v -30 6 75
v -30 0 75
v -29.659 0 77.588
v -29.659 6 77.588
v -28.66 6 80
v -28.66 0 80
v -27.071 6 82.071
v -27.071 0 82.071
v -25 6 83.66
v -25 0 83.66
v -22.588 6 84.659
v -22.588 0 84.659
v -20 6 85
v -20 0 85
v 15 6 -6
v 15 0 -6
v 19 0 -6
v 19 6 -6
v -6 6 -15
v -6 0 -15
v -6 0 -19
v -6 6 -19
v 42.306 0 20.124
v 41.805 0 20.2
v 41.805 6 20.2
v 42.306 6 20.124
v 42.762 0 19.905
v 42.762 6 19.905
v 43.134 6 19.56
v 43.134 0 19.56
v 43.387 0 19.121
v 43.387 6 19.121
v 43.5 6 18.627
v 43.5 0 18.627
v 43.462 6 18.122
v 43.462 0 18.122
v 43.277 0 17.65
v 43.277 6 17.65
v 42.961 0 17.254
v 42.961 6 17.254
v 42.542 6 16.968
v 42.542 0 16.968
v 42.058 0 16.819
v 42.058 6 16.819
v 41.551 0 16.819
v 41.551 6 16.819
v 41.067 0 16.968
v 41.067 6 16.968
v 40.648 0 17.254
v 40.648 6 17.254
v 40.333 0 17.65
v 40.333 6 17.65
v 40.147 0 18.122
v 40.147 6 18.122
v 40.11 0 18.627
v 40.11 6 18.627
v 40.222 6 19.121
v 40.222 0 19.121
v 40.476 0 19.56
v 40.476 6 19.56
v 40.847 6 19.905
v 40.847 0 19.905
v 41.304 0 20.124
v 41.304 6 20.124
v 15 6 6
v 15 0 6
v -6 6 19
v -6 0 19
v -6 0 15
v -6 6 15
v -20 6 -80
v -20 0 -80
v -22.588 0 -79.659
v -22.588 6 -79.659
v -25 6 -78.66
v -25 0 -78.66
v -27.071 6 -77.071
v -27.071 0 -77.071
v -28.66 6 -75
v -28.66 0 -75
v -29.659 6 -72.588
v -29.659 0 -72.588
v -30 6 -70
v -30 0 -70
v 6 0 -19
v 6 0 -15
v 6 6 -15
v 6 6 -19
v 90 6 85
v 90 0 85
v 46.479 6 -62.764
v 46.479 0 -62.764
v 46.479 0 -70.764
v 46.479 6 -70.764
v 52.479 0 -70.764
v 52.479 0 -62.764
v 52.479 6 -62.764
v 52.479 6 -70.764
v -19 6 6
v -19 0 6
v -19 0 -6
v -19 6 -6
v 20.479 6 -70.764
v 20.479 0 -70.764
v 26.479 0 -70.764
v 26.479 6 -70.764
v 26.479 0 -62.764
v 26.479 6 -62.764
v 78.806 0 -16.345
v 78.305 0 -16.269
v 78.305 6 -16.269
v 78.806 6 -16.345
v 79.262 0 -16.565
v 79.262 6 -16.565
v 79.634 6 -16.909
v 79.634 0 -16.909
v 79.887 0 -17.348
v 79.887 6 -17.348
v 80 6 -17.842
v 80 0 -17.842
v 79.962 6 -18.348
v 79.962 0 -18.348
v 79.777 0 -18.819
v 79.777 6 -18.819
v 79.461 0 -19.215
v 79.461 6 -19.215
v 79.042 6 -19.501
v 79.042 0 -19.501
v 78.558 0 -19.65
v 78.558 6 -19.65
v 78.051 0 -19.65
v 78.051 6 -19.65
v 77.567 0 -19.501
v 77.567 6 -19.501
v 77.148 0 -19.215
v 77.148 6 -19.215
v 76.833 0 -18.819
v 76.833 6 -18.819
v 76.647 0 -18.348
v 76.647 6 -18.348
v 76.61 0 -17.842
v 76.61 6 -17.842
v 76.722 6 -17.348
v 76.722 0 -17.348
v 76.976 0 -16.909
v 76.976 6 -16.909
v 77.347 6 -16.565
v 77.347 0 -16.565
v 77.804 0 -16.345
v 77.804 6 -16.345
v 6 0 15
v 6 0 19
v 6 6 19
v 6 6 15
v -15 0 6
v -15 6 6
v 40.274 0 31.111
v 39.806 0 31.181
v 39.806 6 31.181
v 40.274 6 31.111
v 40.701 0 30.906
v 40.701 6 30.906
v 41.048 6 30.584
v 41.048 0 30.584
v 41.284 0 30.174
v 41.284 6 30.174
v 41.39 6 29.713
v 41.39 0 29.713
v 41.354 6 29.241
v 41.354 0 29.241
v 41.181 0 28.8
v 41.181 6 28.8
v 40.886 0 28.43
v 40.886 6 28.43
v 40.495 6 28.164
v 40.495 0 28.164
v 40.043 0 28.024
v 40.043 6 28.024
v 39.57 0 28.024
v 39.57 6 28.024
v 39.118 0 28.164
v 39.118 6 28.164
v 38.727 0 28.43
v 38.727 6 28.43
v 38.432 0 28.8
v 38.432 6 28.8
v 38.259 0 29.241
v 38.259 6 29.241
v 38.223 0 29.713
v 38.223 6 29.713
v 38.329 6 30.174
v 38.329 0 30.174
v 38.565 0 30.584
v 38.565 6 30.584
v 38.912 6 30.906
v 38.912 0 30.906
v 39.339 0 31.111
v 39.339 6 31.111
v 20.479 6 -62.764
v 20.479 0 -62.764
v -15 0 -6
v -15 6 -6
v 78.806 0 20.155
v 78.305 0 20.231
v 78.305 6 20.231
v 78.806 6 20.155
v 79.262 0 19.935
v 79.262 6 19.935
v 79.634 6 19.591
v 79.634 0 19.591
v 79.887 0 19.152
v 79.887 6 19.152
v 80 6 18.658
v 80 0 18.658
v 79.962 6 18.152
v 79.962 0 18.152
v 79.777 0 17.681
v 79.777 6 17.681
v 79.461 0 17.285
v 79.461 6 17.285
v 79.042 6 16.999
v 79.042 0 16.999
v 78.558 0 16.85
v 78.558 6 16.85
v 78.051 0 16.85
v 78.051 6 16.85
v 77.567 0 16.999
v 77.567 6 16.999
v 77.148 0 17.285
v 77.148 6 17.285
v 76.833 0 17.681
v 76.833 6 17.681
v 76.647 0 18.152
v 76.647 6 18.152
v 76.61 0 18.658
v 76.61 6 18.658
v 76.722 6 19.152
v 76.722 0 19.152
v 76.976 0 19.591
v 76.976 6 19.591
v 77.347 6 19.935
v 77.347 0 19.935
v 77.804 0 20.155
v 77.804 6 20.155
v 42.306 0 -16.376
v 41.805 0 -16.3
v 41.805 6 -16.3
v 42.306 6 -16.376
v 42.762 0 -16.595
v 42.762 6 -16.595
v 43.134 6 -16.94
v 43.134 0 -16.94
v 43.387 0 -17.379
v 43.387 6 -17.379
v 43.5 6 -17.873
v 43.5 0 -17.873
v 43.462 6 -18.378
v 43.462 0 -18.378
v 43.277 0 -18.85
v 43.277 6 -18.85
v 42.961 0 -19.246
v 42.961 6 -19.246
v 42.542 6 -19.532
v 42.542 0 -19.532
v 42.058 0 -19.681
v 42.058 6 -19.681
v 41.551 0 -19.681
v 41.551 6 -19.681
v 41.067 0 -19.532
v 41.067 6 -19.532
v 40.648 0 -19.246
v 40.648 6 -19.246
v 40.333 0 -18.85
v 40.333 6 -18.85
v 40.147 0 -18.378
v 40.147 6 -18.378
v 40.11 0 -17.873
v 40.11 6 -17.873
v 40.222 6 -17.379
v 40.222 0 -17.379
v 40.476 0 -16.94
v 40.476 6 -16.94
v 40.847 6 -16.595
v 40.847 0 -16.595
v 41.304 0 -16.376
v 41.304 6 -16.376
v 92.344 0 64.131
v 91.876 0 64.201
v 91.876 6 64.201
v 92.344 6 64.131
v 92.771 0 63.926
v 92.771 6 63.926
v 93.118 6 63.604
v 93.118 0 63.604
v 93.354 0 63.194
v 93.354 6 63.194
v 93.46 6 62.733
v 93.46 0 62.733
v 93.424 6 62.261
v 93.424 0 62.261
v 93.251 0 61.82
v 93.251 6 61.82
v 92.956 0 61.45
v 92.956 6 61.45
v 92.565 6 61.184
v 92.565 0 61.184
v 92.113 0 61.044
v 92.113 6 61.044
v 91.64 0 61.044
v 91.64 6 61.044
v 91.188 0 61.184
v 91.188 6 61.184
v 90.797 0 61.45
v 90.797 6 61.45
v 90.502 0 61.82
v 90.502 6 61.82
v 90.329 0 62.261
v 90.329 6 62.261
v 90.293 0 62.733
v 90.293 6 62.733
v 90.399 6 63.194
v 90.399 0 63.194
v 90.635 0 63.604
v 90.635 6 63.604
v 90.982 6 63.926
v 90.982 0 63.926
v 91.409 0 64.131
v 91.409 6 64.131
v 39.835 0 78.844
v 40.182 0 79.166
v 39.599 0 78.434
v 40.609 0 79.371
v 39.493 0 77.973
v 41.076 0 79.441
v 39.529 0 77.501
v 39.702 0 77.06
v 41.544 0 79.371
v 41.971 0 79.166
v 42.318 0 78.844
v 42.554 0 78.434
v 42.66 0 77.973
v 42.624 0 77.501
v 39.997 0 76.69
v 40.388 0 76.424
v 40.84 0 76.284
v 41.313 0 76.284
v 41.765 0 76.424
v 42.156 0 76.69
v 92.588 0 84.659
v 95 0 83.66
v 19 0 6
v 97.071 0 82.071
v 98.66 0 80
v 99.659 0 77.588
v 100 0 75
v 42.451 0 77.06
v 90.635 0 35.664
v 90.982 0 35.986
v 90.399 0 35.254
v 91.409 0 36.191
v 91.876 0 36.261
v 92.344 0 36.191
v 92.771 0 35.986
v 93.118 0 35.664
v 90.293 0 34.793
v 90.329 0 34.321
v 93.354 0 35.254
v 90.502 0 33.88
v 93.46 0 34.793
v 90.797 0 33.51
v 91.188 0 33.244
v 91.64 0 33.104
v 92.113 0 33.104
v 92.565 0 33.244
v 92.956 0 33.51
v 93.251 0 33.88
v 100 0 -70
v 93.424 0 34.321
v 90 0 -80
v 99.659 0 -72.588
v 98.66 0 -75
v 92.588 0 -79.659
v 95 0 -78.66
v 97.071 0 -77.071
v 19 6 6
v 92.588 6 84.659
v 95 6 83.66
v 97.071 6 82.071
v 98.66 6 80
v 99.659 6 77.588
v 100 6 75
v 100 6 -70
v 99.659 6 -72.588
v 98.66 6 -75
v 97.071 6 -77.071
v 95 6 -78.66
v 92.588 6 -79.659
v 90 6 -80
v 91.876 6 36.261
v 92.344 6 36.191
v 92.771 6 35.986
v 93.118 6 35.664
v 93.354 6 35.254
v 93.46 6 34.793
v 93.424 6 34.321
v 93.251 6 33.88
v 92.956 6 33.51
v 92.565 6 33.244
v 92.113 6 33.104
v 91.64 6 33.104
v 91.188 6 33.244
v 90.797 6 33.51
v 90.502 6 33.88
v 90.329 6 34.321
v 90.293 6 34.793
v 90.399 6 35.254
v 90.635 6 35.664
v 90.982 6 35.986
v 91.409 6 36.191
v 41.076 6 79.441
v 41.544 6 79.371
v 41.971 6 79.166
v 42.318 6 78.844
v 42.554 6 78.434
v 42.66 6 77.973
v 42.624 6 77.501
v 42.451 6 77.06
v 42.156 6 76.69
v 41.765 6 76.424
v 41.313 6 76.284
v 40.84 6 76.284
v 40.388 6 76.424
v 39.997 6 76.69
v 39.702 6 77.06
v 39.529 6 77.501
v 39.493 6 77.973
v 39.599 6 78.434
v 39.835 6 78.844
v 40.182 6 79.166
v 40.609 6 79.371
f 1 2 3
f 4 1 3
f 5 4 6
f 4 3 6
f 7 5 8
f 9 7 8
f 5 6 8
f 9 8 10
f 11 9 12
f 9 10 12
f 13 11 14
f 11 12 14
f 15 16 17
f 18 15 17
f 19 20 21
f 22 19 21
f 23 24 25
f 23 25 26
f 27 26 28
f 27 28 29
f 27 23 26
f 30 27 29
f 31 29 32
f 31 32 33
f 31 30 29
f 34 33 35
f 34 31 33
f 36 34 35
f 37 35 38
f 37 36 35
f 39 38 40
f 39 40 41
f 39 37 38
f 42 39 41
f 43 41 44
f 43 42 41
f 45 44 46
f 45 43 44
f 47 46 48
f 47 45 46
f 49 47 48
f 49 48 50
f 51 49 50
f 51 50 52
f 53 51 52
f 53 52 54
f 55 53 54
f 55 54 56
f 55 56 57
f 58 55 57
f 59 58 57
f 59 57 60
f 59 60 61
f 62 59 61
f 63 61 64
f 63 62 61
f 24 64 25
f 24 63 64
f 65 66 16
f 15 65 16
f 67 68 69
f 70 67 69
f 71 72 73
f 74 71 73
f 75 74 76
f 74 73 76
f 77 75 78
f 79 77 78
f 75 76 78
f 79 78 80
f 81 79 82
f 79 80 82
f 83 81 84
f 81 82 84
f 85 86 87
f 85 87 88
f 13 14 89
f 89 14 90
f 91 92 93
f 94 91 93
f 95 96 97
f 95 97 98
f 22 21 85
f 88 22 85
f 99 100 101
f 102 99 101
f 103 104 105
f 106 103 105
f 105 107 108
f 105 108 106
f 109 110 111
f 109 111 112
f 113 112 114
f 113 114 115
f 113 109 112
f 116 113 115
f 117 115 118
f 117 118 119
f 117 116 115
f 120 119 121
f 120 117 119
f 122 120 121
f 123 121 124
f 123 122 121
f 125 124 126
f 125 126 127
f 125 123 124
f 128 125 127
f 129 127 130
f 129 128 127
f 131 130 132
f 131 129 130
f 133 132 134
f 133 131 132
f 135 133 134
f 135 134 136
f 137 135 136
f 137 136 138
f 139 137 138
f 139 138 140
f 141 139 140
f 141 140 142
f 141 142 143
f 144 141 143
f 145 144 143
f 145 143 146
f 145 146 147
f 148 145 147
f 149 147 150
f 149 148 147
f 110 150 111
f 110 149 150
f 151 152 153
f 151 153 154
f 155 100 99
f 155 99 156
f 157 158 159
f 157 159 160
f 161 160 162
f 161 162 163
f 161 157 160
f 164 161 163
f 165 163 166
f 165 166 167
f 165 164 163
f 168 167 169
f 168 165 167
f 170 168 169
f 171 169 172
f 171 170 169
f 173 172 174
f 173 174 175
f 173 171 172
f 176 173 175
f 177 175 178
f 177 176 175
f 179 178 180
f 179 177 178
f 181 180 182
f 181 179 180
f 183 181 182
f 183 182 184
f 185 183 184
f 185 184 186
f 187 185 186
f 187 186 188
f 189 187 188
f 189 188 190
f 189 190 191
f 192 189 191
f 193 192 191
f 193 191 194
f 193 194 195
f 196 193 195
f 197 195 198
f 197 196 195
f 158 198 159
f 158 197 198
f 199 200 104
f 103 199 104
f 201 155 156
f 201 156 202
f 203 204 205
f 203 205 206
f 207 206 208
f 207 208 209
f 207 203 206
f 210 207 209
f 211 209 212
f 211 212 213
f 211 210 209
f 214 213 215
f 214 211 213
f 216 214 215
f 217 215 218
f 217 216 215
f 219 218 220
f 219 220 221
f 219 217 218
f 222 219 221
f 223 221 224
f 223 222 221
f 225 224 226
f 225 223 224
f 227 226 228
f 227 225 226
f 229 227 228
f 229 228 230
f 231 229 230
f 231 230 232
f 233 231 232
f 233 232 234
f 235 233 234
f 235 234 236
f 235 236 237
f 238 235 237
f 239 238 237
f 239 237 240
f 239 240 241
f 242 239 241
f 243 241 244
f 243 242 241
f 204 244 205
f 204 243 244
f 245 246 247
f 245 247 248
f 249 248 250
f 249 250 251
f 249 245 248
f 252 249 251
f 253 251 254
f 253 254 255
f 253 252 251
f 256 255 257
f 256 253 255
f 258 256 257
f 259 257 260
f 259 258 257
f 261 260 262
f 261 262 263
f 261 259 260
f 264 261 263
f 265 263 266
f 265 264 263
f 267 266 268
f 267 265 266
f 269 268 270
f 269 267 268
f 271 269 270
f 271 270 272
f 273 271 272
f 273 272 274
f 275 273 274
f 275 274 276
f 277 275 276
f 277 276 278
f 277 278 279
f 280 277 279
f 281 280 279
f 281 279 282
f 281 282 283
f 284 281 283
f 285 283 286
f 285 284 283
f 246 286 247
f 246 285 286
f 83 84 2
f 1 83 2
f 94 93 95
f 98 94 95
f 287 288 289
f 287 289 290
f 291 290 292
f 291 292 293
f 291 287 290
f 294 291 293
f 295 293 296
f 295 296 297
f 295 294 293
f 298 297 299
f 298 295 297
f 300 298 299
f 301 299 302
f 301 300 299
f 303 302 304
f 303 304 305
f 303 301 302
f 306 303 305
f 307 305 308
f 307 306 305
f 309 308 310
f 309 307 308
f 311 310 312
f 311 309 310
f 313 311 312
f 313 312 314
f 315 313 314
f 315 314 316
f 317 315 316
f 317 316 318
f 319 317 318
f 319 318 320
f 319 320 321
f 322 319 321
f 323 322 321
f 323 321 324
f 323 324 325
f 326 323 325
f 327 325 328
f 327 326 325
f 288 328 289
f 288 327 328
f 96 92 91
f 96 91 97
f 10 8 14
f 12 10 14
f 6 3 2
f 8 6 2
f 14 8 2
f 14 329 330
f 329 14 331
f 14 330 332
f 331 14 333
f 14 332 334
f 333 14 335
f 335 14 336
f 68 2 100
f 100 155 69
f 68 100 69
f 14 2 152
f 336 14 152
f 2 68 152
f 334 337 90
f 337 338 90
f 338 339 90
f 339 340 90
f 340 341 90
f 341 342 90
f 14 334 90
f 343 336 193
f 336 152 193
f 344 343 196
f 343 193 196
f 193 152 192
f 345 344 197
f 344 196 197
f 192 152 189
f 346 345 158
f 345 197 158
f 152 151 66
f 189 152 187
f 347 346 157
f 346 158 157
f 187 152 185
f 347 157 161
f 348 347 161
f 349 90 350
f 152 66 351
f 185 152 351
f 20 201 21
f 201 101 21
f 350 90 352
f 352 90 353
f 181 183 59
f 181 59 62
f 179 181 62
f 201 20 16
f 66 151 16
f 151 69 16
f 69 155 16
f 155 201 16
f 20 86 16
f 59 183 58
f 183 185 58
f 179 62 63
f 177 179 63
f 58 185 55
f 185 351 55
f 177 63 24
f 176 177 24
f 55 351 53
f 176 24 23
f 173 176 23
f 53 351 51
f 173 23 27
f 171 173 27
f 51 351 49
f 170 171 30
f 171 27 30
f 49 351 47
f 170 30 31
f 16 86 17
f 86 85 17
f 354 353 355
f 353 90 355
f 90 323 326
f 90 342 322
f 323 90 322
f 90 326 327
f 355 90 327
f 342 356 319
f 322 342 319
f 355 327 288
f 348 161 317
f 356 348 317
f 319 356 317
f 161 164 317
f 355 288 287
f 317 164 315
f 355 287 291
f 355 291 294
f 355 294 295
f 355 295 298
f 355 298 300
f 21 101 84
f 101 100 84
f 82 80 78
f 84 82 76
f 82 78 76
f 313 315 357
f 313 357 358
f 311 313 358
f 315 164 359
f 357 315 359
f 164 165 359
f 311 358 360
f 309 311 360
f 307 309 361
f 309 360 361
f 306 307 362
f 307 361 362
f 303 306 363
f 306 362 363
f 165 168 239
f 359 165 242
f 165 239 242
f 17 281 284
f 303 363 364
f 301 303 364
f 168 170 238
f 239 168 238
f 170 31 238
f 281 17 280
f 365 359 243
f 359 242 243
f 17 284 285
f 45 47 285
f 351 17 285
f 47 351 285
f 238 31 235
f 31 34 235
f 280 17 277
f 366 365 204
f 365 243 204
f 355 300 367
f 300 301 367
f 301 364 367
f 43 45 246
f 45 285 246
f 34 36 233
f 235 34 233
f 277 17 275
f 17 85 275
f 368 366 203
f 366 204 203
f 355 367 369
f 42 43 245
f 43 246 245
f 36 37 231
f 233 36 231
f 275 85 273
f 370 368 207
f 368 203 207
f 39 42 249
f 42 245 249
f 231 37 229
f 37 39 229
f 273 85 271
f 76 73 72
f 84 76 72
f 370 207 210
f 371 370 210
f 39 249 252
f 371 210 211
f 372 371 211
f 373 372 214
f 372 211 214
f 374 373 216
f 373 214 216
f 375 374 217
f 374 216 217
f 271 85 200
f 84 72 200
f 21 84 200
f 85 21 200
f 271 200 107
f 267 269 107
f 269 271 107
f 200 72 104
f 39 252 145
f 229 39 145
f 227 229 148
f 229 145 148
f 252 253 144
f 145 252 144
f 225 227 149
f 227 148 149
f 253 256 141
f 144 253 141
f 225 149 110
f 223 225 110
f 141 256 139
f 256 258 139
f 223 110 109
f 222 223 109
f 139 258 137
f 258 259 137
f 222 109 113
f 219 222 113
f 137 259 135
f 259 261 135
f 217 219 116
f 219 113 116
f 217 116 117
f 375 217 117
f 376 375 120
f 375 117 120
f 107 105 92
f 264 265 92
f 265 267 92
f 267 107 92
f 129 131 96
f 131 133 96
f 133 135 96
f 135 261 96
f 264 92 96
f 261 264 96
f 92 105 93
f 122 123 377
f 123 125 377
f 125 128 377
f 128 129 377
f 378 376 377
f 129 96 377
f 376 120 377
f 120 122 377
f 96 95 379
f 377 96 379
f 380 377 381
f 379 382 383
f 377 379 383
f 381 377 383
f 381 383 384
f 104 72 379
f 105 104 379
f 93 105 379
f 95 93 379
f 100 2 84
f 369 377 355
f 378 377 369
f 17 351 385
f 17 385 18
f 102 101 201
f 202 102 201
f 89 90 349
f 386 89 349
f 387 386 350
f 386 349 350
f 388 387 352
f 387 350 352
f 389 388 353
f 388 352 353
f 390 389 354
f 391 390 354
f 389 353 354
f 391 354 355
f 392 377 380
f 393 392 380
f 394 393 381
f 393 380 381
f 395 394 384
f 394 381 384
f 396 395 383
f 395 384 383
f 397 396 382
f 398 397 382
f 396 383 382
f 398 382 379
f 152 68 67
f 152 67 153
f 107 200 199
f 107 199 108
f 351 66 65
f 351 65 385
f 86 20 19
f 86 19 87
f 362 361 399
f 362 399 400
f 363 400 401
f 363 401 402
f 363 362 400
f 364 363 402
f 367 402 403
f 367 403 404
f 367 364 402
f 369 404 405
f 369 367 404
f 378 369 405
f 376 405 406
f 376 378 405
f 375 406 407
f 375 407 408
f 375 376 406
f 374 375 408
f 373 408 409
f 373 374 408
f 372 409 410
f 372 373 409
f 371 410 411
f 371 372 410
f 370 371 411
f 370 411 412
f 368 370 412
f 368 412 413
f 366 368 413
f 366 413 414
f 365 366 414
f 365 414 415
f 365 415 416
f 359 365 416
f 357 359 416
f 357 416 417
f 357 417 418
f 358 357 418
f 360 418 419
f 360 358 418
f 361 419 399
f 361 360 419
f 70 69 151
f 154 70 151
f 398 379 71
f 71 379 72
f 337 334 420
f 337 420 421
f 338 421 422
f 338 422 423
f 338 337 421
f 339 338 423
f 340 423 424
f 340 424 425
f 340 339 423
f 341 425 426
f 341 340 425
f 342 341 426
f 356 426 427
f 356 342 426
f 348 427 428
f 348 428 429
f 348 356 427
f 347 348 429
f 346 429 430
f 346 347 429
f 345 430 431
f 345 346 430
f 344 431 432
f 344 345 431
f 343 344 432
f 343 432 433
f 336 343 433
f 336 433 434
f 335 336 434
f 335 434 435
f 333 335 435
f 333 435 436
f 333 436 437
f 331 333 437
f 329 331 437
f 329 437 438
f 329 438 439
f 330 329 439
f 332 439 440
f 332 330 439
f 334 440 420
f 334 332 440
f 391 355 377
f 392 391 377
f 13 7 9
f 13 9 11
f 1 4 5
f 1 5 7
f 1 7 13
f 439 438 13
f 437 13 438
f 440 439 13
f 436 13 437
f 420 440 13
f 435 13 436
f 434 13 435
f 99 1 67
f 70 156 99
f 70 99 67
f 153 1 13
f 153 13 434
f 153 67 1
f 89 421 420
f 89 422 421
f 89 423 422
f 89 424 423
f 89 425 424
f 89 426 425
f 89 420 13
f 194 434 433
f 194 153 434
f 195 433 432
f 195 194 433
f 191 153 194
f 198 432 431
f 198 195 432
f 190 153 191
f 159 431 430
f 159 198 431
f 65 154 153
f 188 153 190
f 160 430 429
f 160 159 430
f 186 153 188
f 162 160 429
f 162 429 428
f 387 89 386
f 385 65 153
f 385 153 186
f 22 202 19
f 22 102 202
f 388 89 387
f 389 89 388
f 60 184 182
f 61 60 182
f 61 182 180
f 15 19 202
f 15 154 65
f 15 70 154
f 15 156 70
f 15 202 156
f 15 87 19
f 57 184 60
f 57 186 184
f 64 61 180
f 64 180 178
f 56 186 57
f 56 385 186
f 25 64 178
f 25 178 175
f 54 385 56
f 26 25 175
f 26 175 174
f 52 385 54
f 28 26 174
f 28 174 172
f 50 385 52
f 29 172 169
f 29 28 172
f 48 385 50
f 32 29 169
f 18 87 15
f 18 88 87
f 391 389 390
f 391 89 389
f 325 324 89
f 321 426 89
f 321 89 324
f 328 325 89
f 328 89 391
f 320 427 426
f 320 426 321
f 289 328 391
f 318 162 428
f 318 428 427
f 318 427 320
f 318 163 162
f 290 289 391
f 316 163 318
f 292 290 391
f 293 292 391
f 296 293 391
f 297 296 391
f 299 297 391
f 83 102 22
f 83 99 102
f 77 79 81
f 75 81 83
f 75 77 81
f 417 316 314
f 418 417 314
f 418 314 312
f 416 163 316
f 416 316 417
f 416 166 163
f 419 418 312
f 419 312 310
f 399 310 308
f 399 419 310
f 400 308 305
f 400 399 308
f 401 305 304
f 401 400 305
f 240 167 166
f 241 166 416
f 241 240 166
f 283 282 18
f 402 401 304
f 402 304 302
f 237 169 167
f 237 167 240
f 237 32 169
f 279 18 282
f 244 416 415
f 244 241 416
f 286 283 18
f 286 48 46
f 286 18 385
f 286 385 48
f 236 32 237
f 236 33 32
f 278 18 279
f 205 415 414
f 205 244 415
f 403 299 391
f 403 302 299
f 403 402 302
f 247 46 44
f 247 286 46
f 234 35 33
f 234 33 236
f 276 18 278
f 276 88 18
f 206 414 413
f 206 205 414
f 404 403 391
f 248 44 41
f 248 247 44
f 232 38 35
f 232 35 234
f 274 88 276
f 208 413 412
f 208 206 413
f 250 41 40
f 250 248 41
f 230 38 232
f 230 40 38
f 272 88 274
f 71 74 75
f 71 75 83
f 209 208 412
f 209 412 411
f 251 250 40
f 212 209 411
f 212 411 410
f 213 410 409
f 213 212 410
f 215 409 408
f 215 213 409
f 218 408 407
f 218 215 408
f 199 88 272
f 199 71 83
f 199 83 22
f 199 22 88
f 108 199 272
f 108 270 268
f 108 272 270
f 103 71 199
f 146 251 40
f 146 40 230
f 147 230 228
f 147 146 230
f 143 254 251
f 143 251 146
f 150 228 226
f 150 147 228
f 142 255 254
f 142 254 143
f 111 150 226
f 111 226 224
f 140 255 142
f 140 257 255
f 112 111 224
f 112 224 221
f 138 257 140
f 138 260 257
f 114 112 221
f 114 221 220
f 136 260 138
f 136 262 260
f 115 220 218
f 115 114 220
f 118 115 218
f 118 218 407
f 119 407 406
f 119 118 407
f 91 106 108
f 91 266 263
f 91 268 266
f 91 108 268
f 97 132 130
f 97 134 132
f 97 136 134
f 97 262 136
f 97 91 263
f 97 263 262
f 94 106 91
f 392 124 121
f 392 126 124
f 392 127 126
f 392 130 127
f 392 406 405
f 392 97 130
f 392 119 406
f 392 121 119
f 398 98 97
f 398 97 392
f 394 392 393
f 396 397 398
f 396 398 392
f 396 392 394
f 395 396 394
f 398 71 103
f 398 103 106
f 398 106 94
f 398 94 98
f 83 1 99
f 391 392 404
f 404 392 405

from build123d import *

# Parameters (mm, degrees)
SKETCH1_R           = 1.7
SKETCH1_R_2         = 1.5875
SKETCH1_W           = 4
SKETCH1_H           = 12
SKETCH1_W_2         = 12
SKETCH1_H_2         = 4
SKETCH1_W_3         = 6
SKETCH1_H_3         = 8
BOSS_EXTRUDE2_DEPTH = 6


with BuildPart() as part:
    # Sketch1 → Boss-Extrude2 (new body)
    with BuildSketch(Plane(origin=(0, 0, 0), x_dir=(1, 0, 0), z_dir=(0, 1, 0))):
        with BuildLine():
            Line((90, 80), (-20, 80))
            ThreePointArc((-20, 80), (-27.071067812, 77.071067812), (-30, 70))
            Line((-30, 70), (-30, -75))
            ThreePointArc((-30, -75), (-27.071067812, -82.071067812), (-20, -85))
            Line((-20, -85), (90, -85))
            ThreePointArc((90, -85), (97.071067812, -82.071067812), (100, -75))
            Line((100, -75), (100, 70))
            ThreePointArc((100, 70), (97.071067812, 77.071067812), (90, 80))
        make_face()
        with Locations(Location((41.804775222, 18, 0), (0, 0, 270))):
            Circle(SKETCH1_R, mode=Mode.SUBTRACT)
        with Locations(Location((78.304775222, 17.96923253, 0), (0, 0, 270))):
            Circle(SKETCH1_R, mode=Mode.SUBTRACT)
        with Locations(Location((78.304775222, -18.53076747, 0), (0, 0, 270))):
            Circle(SKETCH1_R, mode=Mode.SUBTRACT)
        with Locations(Location((41.804775222, -18.5, 0), (0, 0, 270))):
            Circle(SKETCH1_R, mode=Mode.SUBTRACT)
        with Locations(Location((39.806499109, -29.593870337, 0), (0, 0, 270))):
            Circle(SKETCH1_R_2, mode=Mode.SUBTRACT)
        with Locations(Location((91.876499109, -34.673870337, 0), (0, 0, 270))):
            Circle(SKETCH1_R_2, mode=Mode.SUBTRACT)
        with Locations(Location((91.876499109, -62.613870337, 0), (0, 0, 270))):
            Circle(SKETCH1_R_2, mode=Mode.SUBTRACT)
        with Locations(Location((41.076499109, -77.853870337, 0), (0, 0, 270))):
            Circle(SKETCH1_R_2, mode=Mode.SUBTRACT)
        with Locations((-17, 0)):
            Rectangle(SKETCH1_W, SKETCH1_H, mode=Mode.SUBTRACT)
        with Locations((0, 17)):
            Rectangle(SKETCH1_W_2, SKETCH1_H_2, mode=Mode.SUBTRACT)
        with Locations((17, 0)):
            Rectangle(SKETCH1_W, SKETCH1_H, mode=Mode.SUBTRACT)
        with Locations((0, -17)):
            Rectangle(SKETCH1_W_2, SKETCH1_H_2, mode=Mode.SUBTRACT)
        with Locations((23.479105259, 66.763598247)):
            Rectangle(SKETCH1_W_3, SKETCH1_H_3, mode=Mode.SUBTRACT)
        with Locations((49.479105259, 66.763598247)):
            Rectangle(SKETCH1_W_3, SKETCH1_H_3, mode=Mode.SUBTRACT)
    extrude(amount=BOSS_EXTRUDE2_DEPTH)


solid = part.part
